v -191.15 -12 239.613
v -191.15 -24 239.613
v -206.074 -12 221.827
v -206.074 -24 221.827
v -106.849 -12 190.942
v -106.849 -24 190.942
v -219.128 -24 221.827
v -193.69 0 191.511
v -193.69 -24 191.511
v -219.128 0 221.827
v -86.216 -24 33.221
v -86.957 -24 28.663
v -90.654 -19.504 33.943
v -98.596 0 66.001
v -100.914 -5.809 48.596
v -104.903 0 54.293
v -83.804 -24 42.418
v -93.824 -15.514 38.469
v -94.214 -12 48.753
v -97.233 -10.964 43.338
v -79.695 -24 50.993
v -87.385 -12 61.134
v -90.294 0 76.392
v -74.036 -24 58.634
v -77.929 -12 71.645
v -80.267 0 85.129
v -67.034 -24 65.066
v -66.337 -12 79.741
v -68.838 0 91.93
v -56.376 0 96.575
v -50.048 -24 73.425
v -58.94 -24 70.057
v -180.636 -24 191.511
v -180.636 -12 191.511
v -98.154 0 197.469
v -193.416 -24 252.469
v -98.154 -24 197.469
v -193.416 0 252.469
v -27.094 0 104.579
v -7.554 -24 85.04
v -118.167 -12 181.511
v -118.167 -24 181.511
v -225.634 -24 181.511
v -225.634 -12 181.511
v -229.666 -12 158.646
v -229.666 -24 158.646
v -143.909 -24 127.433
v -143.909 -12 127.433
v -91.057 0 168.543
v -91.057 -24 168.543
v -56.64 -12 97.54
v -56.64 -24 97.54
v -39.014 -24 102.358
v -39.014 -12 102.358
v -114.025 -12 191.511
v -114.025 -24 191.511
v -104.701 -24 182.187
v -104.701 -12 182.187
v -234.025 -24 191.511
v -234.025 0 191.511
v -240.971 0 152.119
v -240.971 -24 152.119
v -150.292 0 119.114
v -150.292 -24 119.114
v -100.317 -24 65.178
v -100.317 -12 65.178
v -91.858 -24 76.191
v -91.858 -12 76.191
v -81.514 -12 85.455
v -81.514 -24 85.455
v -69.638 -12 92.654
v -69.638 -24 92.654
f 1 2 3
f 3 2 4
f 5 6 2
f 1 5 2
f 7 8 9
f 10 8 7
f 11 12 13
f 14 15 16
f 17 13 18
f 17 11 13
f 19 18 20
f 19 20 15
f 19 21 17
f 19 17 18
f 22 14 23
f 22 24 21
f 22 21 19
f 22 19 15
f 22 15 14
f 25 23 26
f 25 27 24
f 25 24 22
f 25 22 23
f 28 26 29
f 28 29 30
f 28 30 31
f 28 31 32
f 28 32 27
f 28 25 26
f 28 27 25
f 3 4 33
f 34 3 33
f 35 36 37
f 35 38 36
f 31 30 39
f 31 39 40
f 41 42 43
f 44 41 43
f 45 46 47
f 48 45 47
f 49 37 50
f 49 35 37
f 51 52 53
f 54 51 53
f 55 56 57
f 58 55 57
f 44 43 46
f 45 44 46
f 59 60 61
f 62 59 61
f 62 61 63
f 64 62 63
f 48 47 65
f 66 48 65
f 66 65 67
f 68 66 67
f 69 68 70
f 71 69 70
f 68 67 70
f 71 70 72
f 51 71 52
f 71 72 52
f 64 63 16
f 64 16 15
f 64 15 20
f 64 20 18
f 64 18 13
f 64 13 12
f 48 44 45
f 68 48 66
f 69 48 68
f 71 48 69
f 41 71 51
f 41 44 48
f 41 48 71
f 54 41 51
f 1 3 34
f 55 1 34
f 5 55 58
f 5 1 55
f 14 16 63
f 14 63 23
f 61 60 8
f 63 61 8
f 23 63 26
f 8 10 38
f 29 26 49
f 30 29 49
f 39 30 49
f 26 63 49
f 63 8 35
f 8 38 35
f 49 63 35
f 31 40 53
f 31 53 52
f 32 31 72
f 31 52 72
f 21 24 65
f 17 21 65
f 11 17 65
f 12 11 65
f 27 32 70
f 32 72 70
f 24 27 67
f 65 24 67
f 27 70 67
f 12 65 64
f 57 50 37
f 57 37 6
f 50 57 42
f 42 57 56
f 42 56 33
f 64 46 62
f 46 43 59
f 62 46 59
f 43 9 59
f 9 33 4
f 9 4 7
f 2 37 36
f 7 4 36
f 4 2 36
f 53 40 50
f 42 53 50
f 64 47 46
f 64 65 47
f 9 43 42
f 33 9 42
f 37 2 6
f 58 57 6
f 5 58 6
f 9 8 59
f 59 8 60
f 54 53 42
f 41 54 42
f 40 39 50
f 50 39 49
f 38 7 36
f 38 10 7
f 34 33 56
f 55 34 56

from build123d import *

# Parameters (mm, degrees)
F1_DEPTH    = 24
F2_R        = 50
F3_T1_DEPTH = 105.7731172378
F3_T3_DEPTH = 66.3378383392
F3_T6_ANGLE = 65.4740658064
F6_DEPTH    = 12
F8_DEPTH    = 12
F9_DEPTH    = 12
F11_DEPTH   = 12


# Not quite as in the source:
# - a fillet or chamfer that OpenCascade refuses, or shapes differently, is made with other operations: its cross-section is extruded or revolved along the edge and cut away or added


with BuildPart() as f1:
    # F0 (on Front) → F1 (new body)
    with BuildSketch(Plane.XZ):
        Polygon((-81.055521965, 64.9488791823), (-7.5541026236, 85.0398655279), (-114.0252747561, 191.5110376604), (-234.0252747561, 191.5110376604), (-240.9712018628, 152.1187275399), (-150.2916823338, 119.1140815738), (-86.9572677666, 28.6631636514), align=None)
    extrude(amount=F1_DEPTH)

    # F2
    f2_edges = [f1.edges().sort_by_distance(p)[0] for p in [
        (-81.055522, -12, 64.948879),
    ]]
    fillet(f2_edges, radius=F2_R)

    # F3: chamfer of 24 on 2 edges, made by hand

    # F3_s2 → F3_t1 (cut)
    with BuildSketch(Plane(origin=(-27.8938692058, 0, -7.6245513401), x_dir=(0, 1, 0), z_dir=(0.9646132681, 0, 0.2636688131))):
        Polygon((0, 108.0223638788), (-24, 84.0223638788), (0, 84.0223638788), align=None)
    extrude(amount=F3_T1_DEPTH, mode=Mode.SUBTRACT)

    # F3_s4 → F3_t3 (cut)
    with BuildSketch(Plane(origin=(-7.6076630021, 0, -46.7742096713), x_dir=(0, 1, 0), z_dir=(0.1605369785, 0, 0.9870298266))):
        Polygon((-24, 90.4309146097), (0, 114.4309146097), (0, 90.4309146097), align=None)
    extrude(amount=F3_T3_DEPTH, mode=Mode.SUBTRACT)

    # F3_s5 → F3_t6 (revolve, cut)
    with BuildSketch(Plane(origin=(3.0420131267, 0, 18.7032153992), x_dir=(0, 1, 0), z_dir=(-0.1605369785, 0, -0.9870298266))):
        Polygon((0, -114.4309146097), (-24, -90.4309146097), (0, -90.4309146097), align=None)
    revolve(axis=Axis((-36.8645055082, 0, 25.1938722697), (0, 1, 0)), revolution_arc=F3_T6_ANGLE, mode=Mode.SUBTRACT)

    # F5 (on face) → F6 (join)
    with BuildSketch(Plane(origin=(0, 0, 0), x_dir=(-1, 0, 0), z_dir=(0, 1, 0))):
        Polygon((84.0423926711, 139.9491429329), (163.5881303991, 155.6373062127), (219.1278844576, 221.8270076437), (193.4163800701, 252.4687853684), (98.1535856538, 197.4687853684), align=None)
    extrude(amount=-F6_DEPTH)

    # F7 (on face) → F8 (cut)
    with BuildSketch(Plane.XZ.offset(24)):
        with BuildLine():
            Line((-143.908641448, 127.432622412), (-100.3174393188, 65.1779339797))
            ThreePointArc((-100.3174393188, 65.1779339797), (-81.5137230154, 85.4553639206), (-56.6396664901, 97.5398673775))
            Line((-56.6396664901, 97.5398673775), (-39.014051648, 102.3576789286))
            Line((-39.014051648, 102.3576789286), (-118.1674103798, 181.5110376604))
            Line((-118.1674103798, 181.5110376604), (-225.6342784443, 181.5110376604))
            Line((-225.6342784443, 181.5110376604), (-229.6660431143, 158.6457639866))
            Line((-229.6660431143, 158.6457639866), (-143.908641448, 127.432622412))
        make_face()
    extrude(amount=-F8_DEPTH, mode=Mode.SUBTRACT)

    # F9 (add): a face of the model
    f9_faces = [f1.faces().sort_by_distance(p)[0] for p in [
        (-164.1324178165, -12, 212.498446066),
    ]]
    extrude(f9_faces, amount=F9_DEPTH)

    # F10 (on face) → F11 (cut)
    with BuildSketch(Plane.XZ.offset(24)):
        Polygon((-104.7010093218, 182.1867722261), (-106.848922609, 190.9420351164), (-191.149564101, 239.6130331747), (-206.0738115642, 221.8270076437), (-180.6356923325, 191.5110376604), (-114.0252747561, 191.5110376604), align=None)
    extrude(amount=-F11_DEPTH, mode=Mode.SUBTRACT)


solid = f1.part
